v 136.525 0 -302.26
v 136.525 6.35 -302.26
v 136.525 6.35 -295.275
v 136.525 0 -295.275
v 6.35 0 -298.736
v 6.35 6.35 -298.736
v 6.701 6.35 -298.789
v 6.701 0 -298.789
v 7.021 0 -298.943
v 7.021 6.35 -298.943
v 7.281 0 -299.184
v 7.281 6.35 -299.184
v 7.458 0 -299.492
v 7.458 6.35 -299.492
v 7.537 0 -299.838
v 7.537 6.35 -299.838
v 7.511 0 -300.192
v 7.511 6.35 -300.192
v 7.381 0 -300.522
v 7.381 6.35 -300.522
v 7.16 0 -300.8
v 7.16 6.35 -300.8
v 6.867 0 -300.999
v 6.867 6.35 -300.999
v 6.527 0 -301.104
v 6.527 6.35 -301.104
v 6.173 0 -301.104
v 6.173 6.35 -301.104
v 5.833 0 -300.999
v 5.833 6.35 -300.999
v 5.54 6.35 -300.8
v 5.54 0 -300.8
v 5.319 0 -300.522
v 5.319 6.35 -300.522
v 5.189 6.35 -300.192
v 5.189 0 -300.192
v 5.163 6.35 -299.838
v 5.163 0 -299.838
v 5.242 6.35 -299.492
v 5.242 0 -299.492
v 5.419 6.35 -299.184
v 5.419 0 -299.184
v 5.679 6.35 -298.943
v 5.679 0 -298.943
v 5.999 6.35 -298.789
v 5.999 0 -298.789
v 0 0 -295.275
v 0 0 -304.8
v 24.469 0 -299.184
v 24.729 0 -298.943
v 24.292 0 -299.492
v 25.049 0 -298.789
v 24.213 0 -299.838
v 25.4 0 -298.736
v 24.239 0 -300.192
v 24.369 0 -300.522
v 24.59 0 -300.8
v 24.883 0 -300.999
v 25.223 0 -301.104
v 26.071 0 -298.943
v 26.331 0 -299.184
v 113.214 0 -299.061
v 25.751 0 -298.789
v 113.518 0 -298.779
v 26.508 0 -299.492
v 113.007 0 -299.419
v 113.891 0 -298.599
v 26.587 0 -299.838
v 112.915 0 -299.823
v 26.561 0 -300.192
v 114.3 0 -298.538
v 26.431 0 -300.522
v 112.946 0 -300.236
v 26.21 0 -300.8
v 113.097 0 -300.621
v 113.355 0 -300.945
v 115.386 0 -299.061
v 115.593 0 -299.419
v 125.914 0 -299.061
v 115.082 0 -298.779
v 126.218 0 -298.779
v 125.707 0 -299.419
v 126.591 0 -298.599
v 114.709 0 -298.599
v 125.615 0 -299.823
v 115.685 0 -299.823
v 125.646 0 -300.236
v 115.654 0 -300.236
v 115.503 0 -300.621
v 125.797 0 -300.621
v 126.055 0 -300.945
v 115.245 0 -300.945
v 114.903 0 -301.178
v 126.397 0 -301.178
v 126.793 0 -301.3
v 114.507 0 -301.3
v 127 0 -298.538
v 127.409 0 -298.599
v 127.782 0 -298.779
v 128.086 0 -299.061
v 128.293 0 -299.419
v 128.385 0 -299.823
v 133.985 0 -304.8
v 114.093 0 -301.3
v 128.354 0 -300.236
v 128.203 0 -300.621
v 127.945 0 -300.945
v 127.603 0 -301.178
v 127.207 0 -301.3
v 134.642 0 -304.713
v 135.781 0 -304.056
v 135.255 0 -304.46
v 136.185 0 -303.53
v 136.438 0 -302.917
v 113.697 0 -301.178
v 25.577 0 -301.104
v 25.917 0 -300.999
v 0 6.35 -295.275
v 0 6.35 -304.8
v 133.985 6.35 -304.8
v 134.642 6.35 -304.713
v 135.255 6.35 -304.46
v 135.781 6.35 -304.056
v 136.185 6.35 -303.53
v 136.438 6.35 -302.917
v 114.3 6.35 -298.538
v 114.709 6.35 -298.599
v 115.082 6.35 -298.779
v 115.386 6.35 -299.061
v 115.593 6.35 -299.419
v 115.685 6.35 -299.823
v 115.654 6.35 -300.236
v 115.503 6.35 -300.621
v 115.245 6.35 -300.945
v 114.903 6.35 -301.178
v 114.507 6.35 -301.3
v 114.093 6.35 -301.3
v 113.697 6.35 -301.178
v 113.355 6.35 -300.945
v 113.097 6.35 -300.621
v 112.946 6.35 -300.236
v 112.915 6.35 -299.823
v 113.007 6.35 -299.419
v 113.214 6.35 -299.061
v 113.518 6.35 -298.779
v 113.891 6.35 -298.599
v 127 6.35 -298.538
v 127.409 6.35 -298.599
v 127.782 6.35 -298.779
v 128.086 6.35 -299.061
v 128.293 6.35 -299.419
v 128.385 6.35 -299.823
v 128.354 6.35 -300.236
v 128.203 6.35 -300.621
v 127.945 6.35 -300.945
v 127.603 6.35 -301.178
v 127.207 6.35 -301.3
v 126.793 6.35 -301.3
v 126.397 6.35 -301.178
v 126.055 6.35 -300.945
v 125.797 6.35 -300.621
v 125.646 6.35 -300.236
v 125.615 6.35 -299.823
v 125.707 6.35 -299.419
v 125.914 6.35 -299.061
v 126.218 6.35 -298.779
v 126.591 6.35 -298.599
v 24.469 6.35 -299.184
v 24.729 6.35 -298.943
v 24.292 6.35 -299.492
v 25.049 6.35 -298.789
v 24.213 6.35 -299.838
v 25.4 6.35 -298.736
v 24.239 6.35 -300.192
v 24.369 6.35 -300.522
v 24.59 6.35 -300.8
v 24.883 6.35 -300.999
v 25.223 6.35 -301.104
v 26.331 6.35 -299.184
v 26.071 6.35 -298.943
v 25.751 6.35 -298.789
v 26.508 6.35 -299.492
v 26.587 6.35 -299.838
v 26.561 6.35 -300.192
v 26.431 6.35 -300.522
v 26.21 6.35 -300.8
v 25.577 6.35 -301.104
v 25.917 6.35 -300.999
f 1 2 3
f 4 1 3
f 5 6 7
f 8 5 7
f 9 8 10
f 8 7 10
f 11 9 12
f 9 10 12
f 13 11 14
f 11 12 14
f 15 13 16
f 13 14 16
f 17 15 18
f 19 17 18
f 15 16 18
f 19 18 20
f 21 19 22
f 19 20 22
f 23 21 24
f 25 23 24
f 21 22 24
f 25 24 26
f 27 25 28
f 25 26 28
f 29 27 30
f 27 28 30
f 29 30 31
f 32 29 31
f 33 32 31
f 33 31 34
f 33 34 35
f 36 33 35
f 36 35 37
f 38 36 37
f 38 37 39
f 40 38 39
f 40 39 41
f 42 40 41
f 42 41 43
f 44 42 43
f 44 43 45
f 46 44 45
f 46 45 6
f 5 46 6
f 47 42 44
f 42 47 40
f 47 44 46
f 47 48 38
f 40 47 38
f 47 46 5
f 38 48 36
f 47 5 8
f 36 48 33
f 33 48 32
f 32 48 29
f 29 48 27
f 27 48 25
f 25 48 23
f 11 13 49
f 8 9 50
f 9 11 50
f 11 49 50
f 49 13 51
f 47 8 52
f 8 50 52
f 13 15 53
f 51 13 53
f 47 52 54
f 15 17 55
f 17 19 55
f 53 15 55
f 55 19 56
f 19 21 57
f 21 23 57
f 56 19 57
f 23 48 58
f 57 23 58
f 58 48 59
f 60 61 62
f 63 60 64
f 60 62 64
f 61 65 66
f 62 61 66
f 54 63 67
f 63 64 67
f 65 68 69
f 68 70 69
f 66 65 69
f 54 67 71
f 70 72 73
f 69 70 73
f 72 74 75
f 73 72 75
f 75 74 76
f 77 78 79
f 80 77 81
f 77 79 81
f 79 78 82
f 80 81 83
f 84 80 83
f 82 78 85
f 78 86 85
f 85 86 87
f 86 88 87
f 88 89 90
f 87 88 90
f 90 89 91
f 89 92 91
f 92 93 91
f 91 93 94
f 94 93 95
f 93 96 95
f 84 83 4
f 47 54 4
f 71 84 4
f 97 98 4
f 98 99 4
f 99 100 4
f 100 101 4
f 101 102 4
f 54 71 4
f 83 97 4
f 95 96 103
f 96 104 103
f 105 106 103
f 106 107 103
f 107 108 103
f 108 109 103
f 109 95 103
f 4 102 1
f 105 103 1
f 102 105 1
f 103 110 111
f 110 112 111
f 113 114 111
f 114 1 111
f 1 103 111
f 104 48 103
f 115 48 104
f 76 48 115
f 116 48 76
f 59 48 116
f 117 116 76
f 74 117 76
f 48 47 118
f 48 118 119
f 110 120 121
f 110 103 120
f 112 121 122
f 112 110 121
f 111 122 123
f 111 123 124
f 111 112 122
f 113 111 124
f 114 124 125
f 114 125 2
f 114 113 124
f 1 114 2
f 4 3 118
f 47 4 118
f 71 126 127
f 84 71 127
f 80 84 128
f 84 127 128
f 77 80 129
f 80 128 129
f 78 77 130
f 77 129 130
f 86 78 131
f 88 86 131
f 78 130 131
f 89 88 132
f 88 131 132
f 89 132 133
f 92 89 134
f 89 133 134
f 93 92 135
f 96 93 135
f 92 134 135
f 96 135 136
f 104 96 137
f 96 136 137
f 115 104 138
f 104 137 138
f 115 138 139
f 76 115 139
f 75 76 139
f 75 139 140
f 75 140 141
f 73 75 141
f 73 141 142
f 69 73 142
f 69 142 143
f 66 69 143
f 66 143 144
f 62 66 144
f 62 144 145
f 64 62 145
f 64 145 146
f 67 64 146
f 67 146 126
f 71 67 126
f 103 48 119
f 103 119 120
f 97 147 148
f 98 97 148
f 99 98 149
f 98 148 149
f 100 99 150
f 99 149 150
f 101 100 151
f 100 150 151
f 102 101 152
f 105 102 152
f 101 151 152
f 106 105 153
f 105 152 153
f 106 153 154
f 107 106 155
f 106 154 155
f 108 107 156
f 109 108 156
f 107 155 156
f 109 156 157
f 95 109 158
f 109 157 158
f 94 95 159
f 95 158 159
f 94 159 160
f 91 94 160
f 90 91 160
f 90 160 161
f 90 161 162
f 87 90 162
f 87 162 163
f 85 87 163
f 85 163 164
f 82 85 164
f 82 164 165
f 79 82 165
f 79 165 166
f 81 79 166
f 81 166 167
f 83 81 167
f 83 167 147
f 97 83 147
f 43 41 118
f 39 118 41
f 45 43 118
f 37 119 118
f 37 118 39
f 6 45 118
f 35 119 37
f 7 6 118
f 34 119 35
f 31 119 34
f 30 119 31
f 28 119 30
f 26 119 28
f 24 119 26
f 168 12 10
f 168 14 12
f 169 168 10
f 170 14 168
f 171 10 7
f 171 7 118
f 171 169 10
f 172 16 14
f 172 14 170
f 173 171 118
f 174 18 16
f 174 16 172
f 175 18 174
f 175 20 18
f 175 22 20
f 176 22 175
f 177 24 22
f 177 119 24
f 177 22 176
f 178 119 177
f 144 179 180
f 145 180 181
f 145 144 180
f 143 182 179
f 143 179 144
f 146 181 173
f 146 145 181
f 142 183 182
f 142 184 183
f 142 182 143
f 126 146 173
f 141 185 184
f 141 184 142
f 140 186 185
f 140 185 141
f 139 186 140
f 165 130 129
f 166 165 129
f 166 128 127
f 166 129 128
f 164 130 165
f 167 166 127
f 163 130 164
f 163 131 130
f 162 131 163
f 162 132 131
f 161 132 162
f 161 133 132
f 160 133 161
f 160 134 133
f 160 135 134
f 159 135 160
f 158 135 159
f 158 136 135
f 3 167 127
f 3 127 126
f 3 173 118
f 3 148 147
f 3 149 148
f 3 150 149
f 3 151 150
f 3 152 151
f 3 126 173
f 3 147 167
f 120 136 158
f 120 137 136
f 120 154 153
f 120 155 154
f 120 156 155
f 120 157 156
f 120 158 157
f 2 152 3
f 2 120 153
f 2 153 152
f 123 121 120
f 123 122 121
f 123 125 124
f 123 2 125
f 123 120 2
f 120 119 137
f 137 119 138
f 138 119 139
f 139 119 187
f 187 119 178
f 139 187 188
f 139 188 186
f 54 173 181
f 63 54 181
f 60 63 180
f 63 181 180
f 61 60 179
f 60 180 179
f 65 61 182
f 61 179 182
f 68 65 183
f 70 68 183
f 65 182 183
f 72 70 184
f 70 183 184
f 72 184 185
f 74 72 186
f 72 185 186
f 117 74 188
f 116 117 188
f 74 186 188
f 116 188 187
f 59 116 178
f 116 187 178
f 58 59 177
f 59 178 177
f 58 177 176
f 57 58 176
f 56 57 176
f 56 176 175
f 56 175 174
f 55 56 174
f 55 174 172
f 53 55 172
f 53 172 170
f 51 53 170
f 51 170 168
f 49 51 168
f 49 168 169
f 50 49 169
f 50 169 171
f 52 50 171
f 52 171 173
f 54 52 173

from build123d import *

# Parameters (mm, degrees)
SKETCH1_W           = 304.8
SKETCH1_H           = 304.8
BOSS_EXTRUDE1_DEPTH = 6.35
CUT_EXTRUDE2_DEPTH  = 6.35
SKETCH3_R           = 1.190625
SKETCH3_R_2         = 1.3890625
CUT_EXTRUDE3_DEPTH  = 335.039575687
FILLET2_R           = 2.54


with BuildPart() as part:
    # Sketch1 → Boss-Extrude1 (new body)
    with BuildSketch(Plane(origin=(0, 0, 0), x_dir=(1, 0, 0), z_dir=(0, 1, 0))):
        with Locations((152.4, 152.4)):
            Rectangle(SKETCH1_W, SKETCH1_H)
    extrude(amount=BOSS_EXTRUDE1_DEPTH)

    # Sketch2 → Cut-Extrude2 (cut)
    with BuildSketch(Plane(origin=(0, 6.35, 0), x_dir=(1, 0, 0), z_dir=(0, 1, 0))):
        Polygon((136.525, 304.8), (136.525, 295.275), (0, 295.275), (0, 0), (304.8, 0), (304.8, 304.8), align=None)
    extrude(amount=-CUT_EXTRUDE2_DEPTH, mode=Mode.SUBTRACT)

    # Sketch3 → Cut-Extrude3 (cut, through all)
    with BuildSketch(Plane(origin=(0, 6.35, 0), x_dir=(1, 0, 0), z_dir=(0, 1, 0))):
        with Locations(Location((6.35, 299.92676377, 0), (0, 0, 270))):
            Circle(SKETCH3_R)
        with Locations(Location((25.4, 299.92676377, 0), (0, 0, 270))):
            Circle(SKETCH3_R)
        with Locations(Location((114.3, 299.92676377, 0), (0, 0, 270))):
            Circle(SKETCH3_R_2)
        with Locations(Location((127, 299.92676377, 0), (0, 0, 270))):
            Circle(SKETCH3_R_2)
    extrude(amount=-CUT_EXTRUDE3_DEPTH, mode=Mode.SUBTRACT)

    # Fillet2
    fillet2_edges = [part.edges().sort_by_distance(p)[0] for p in [
        (136.525, 3.175, -304.8),
    ]]
    fillet(fillet2_edges, radius=FILLET2_R)


solid = part.part
